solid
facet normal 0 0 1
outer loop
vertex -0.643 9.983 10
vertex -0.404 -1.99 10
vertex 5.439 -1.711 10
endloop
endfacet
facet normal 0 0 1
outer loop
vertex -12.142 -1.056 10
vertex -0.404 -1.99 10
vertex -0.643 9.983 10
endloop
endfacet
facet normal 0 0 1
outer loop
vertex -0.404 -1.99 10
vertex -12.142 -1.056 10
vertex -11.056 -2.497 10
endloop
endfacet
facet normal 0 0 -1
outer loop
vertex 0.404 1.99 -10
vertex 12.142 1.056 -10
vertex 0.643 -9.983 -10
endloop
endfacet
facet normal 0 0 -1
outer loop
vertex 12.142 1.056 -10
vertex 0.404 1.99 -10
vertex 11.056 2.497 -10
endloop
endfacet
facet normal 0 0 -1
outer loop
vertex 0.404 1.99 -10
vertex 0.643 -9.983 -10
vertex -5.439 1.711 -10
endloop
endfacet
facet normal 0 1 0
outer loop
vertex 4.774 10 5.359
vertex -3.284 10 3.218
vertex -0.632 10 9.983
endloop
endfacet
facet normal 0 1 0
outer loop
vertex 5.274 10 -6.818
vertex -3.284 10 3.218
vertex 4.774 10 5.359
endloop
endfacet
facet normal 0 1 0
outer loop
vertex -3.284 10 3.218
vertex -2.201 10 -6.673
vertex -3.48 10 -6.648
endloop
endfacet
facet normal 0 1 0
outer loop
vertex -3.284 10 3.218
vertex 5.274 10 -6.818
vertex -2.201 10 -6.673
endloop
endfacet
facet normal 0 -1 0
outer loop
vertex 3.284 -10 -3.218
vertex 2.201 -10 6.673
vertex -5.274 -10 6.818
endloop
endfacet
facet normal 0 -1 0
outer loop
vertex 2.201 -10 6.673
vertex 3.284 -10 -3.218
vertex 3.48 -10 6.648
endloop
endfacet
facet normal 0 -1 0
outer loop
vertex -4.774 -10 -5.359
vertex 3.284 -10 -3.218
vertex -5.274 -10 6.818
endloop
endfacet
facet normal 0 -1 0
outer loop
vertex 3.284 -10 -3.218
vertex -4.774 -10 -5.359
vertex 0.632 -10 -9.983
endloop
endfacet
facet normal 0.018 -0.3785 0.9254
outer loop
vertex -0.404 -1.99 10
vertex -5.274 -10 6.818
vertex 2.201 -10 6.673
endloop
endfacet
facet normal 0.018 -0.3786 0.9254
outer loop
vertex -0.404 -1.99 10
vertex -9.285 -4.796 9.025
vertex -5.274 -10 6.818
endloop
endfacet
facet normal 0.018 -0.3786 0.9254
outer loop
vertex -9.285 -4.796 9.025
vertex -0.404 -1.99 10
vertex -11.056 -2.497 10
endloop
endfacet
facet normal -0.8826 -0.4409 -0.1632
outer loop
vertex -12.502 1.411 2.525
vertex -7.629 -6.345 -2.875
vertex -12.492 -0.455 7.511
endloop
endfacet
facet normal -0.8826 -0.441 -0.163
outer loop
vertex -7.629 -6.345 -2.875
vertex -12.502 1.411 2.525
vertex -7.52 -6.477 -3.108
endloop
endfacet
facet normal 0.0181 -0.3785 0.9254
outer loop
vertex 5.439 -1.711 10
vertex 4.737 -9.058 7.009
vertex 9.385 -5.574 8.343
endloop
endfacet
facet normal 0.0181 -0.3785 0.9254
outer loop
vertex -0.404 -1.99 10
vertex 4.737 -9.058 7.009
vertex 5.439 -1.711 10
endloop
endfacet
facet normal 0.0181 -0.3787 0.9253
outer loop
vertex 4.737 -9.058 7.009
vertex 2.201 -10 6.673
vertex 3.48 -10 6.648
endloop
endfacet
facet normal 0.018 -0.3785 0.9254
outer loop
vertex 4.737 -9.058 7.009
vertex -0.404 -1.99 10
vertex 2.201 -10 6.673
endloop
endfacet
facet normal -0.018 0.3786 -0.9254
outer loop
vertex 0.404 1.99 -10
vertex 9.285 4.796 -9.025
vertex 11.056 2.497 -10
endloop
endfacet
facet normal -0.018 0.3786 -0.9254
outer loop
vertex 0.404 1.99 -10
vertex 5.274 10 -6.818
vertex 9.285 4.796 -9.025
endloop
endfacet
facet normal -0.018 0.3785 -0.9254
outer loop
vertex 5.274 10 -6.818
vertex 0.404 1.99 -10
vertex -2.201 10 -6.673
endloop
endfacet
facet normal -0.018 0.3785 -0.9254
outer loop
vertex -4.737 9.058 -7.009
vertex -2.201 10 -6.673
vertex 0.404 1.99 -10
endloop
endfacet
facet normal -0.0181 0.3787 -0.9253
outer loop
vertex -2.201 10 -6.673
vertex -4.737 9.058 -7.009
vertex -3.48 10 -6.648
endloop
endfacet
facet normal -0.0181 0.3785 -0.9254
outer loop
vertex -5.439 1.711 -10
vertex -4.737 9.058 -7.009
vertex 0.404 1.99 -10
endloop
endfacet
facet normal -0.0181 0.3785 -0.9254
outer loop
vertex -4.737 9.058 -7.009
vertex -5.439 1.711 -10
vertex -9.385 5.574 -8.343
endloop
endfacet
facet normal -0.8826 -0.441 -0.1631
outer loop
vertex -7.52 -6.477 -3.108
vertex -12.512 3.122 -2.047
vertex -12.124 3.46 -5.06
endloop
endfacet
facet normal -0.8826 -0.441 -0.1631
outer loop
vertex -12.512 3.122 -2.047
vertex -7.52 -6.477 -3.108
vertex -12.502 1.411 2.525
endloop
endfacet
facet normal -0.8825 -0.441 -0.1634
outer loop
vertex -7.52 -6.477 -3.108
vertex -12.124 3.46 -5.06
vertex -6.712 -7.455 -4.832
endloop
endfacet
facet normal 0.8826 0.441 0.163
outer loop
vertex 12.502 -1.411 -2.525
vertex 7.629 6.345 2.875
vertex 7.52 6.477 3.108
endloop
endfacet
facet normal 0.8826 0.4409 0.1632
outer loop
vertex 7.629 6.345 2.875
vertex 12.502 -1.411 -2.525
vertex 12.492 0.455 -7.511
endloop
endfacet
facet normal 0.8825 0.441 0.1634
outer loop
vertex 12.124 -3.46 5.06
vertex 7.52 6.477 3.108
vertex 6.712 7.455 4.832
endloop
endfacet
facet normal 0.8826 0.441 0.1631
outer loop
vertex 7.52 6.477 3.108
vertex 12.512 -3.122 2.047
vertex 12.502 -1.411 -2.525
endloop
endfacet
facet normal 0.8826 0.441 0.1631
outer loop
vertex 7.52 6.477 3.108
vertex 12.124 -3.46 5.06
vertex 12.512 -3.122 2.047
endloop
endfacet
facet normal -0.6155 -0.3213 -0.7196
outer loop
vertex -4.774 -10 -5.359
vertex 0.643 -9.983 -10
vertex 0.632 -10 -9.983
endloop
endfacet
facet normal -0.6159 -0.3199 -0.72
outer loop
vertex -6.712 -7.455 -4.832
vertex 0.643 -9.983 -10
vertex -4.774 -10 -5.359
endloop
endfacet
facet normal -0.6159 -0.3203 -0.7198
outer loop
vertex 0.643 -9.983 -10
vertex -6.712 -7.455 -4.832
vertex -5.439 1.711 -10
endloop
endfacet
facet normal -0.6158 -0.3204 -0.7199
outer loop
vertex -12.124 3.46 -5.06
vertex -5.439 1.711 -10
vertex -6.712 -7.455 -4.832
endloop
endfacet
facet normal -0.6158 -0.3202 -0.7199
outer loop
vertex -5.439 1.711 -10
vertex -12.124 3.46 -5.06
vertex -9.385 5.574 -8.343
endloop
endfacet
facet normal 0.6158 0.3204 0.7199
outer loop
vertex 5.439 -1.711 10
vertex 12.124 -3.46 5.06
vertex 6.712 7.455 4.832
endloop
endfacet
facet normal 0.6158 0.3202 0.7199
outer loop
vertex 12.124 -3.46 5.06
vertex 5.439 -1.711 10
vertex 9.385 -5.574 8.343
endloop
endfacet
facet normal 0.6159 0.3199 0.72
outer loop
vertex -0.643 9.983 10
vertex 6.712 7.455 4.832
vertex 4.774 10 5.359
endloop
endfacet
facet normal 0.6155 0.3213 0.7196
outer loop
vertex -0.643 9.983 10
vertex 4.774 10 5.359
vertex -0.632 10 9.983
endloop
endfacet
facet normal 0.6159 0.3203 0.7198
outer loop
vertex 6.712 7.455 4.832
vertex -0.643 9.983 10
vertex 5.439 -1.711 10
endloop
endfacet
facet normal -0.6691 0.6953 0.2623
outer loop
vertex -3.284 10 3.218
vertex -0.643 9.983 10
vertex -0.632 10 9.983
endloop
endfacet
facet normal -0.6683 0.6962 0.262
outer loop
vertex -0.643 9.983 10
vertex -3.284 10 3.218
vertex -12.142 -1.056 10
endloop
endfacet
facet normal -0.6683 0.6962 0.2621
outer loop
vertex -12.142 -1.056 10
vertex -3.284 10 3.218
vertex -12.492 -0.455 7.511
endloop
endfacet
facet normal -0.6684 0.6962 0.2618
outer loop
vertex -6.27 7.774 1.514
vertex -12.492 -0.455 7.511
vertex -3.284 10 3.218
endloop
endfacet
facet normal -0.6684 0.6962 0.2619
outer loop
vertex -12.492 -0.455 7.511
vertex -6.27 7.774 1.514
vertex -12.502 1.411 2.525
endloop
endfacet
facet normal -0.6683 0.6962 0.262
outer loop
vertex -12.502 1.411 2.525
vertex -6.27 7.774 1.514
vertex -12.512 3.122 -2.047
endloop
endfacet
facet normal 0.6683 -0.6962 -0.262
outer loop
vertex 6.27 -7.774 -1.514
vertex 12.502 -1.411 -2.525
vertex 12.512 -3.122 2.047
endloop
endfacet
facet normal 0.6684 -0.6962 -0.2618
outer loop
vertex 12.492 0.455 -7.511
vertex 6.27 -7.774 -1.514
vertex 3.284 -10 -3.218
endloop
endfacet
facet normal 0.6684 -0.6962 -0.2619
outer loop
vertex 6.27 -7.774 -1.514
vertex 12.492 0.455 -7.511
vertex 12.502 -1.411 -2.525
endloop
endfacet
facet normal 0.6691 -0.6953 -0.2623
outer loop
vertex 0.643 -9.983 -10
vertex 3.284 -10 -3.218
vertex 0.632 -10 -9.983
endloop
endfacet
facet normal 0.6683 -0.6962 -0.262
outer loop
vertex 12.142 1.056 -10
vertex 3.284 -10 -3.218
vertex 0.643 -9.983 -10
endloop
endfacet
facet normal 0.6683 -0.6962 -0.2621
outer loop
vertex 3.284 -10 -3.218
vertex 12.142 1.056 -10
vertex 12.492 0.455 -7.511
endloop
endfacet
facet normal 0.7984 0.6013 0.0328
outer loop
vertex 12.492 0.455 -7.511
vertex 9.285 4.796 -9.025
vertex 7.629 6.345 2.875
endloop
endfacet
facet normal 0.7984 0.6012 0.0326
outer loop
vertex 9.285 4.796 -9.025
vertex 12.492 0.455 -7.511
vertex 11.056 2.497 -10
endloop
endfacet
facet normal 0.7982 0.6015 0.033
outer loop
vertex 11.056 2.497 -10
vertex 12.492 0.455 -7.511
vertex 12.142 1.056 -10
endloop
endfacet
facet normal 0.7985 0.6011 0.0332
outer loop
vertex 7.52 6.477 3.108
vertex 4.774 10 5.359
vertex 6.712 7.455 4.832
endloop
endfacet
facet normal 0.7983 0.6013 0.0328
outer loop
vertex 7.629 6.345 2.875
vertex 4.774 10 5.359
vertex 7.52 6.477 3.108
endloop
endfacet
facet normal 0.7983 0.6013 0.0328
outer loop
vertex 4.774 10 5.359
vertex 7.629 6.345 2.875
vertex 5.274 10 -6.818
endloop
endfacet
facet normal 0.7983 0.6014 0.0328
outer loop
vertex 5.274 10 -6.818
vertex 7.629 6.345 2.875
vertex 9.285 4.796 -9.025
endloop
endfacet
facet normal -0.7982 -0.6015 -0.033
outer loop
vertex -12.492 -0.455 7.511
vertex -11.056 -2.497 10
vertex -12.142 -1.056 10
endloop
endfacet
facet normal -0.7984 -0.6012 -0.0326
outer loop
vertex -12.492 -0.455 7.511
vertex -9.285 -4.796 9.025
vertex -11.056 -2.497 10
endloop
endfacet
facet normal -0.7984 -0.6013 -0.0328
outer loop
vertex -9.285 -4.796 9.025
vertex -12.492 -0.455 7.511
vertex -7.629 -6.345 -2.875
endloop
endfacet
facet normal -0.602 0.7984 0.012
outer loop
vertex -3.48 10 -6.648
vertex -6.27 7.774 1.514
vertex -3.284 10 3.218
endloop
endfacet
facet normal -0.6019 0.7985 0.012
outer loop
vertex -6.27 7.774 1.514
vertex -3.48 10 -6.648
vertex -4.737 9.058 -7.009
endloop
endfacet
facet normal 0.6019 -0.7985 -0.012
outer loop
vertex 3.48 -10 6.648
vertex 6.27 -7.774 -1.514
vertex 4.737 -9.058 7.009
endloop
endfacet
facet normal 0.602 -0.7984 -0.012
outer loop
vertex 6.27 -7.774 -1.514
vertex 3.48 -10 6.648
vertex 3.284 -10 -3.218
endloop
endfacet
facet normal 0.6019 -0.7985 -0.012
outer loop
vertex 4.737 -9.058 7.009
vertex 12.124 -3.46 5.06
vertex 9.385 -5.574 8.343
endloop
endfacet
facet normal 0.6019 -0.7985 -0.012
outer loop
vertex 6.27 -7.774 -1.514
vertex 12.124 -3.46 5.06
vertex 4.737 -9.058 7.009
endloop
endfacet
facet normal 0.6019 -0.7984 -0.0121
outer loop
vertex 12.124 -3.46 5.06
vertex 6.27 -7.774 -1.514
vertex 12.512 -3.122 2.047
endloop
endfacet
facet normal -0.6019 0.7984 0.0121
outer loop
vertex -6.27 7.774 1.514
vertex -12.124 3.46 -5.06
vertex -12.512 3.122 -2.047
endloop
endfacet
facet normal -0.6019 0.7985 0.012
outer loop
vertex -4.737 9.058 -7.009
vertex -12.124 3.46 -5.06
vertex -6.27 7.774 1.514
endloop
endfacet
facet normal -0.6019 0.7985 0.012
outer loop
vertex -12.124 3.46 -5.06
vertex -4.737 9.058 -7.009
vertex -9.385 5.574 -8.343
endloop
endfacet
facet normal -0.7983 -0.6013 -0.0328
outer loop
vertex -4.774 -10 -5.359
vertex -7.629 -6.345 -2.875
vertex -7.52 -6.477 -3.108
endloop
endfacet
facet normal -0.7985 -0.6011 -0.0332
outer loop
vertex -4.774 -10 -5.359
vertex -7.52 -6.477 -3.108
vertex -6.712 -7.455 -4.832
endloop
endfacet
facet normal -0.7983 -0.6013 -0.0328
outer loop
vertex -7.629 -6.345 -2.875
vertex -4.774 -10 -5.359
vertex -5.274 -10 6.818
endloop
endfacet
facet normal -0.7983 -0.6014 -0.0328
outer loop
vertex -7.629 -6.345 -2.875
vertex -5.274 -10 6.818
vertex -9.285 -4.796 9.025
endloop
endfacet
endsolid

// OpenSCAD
 intersection_for(i = [ [  0,  0,   0],
 			[ 10, 20, 300],
 			[200, 40,  57],
 			[ 20, 88,  57] ])
{
    rotate(i)
    cube([100, 20, 20], center = true);
}
